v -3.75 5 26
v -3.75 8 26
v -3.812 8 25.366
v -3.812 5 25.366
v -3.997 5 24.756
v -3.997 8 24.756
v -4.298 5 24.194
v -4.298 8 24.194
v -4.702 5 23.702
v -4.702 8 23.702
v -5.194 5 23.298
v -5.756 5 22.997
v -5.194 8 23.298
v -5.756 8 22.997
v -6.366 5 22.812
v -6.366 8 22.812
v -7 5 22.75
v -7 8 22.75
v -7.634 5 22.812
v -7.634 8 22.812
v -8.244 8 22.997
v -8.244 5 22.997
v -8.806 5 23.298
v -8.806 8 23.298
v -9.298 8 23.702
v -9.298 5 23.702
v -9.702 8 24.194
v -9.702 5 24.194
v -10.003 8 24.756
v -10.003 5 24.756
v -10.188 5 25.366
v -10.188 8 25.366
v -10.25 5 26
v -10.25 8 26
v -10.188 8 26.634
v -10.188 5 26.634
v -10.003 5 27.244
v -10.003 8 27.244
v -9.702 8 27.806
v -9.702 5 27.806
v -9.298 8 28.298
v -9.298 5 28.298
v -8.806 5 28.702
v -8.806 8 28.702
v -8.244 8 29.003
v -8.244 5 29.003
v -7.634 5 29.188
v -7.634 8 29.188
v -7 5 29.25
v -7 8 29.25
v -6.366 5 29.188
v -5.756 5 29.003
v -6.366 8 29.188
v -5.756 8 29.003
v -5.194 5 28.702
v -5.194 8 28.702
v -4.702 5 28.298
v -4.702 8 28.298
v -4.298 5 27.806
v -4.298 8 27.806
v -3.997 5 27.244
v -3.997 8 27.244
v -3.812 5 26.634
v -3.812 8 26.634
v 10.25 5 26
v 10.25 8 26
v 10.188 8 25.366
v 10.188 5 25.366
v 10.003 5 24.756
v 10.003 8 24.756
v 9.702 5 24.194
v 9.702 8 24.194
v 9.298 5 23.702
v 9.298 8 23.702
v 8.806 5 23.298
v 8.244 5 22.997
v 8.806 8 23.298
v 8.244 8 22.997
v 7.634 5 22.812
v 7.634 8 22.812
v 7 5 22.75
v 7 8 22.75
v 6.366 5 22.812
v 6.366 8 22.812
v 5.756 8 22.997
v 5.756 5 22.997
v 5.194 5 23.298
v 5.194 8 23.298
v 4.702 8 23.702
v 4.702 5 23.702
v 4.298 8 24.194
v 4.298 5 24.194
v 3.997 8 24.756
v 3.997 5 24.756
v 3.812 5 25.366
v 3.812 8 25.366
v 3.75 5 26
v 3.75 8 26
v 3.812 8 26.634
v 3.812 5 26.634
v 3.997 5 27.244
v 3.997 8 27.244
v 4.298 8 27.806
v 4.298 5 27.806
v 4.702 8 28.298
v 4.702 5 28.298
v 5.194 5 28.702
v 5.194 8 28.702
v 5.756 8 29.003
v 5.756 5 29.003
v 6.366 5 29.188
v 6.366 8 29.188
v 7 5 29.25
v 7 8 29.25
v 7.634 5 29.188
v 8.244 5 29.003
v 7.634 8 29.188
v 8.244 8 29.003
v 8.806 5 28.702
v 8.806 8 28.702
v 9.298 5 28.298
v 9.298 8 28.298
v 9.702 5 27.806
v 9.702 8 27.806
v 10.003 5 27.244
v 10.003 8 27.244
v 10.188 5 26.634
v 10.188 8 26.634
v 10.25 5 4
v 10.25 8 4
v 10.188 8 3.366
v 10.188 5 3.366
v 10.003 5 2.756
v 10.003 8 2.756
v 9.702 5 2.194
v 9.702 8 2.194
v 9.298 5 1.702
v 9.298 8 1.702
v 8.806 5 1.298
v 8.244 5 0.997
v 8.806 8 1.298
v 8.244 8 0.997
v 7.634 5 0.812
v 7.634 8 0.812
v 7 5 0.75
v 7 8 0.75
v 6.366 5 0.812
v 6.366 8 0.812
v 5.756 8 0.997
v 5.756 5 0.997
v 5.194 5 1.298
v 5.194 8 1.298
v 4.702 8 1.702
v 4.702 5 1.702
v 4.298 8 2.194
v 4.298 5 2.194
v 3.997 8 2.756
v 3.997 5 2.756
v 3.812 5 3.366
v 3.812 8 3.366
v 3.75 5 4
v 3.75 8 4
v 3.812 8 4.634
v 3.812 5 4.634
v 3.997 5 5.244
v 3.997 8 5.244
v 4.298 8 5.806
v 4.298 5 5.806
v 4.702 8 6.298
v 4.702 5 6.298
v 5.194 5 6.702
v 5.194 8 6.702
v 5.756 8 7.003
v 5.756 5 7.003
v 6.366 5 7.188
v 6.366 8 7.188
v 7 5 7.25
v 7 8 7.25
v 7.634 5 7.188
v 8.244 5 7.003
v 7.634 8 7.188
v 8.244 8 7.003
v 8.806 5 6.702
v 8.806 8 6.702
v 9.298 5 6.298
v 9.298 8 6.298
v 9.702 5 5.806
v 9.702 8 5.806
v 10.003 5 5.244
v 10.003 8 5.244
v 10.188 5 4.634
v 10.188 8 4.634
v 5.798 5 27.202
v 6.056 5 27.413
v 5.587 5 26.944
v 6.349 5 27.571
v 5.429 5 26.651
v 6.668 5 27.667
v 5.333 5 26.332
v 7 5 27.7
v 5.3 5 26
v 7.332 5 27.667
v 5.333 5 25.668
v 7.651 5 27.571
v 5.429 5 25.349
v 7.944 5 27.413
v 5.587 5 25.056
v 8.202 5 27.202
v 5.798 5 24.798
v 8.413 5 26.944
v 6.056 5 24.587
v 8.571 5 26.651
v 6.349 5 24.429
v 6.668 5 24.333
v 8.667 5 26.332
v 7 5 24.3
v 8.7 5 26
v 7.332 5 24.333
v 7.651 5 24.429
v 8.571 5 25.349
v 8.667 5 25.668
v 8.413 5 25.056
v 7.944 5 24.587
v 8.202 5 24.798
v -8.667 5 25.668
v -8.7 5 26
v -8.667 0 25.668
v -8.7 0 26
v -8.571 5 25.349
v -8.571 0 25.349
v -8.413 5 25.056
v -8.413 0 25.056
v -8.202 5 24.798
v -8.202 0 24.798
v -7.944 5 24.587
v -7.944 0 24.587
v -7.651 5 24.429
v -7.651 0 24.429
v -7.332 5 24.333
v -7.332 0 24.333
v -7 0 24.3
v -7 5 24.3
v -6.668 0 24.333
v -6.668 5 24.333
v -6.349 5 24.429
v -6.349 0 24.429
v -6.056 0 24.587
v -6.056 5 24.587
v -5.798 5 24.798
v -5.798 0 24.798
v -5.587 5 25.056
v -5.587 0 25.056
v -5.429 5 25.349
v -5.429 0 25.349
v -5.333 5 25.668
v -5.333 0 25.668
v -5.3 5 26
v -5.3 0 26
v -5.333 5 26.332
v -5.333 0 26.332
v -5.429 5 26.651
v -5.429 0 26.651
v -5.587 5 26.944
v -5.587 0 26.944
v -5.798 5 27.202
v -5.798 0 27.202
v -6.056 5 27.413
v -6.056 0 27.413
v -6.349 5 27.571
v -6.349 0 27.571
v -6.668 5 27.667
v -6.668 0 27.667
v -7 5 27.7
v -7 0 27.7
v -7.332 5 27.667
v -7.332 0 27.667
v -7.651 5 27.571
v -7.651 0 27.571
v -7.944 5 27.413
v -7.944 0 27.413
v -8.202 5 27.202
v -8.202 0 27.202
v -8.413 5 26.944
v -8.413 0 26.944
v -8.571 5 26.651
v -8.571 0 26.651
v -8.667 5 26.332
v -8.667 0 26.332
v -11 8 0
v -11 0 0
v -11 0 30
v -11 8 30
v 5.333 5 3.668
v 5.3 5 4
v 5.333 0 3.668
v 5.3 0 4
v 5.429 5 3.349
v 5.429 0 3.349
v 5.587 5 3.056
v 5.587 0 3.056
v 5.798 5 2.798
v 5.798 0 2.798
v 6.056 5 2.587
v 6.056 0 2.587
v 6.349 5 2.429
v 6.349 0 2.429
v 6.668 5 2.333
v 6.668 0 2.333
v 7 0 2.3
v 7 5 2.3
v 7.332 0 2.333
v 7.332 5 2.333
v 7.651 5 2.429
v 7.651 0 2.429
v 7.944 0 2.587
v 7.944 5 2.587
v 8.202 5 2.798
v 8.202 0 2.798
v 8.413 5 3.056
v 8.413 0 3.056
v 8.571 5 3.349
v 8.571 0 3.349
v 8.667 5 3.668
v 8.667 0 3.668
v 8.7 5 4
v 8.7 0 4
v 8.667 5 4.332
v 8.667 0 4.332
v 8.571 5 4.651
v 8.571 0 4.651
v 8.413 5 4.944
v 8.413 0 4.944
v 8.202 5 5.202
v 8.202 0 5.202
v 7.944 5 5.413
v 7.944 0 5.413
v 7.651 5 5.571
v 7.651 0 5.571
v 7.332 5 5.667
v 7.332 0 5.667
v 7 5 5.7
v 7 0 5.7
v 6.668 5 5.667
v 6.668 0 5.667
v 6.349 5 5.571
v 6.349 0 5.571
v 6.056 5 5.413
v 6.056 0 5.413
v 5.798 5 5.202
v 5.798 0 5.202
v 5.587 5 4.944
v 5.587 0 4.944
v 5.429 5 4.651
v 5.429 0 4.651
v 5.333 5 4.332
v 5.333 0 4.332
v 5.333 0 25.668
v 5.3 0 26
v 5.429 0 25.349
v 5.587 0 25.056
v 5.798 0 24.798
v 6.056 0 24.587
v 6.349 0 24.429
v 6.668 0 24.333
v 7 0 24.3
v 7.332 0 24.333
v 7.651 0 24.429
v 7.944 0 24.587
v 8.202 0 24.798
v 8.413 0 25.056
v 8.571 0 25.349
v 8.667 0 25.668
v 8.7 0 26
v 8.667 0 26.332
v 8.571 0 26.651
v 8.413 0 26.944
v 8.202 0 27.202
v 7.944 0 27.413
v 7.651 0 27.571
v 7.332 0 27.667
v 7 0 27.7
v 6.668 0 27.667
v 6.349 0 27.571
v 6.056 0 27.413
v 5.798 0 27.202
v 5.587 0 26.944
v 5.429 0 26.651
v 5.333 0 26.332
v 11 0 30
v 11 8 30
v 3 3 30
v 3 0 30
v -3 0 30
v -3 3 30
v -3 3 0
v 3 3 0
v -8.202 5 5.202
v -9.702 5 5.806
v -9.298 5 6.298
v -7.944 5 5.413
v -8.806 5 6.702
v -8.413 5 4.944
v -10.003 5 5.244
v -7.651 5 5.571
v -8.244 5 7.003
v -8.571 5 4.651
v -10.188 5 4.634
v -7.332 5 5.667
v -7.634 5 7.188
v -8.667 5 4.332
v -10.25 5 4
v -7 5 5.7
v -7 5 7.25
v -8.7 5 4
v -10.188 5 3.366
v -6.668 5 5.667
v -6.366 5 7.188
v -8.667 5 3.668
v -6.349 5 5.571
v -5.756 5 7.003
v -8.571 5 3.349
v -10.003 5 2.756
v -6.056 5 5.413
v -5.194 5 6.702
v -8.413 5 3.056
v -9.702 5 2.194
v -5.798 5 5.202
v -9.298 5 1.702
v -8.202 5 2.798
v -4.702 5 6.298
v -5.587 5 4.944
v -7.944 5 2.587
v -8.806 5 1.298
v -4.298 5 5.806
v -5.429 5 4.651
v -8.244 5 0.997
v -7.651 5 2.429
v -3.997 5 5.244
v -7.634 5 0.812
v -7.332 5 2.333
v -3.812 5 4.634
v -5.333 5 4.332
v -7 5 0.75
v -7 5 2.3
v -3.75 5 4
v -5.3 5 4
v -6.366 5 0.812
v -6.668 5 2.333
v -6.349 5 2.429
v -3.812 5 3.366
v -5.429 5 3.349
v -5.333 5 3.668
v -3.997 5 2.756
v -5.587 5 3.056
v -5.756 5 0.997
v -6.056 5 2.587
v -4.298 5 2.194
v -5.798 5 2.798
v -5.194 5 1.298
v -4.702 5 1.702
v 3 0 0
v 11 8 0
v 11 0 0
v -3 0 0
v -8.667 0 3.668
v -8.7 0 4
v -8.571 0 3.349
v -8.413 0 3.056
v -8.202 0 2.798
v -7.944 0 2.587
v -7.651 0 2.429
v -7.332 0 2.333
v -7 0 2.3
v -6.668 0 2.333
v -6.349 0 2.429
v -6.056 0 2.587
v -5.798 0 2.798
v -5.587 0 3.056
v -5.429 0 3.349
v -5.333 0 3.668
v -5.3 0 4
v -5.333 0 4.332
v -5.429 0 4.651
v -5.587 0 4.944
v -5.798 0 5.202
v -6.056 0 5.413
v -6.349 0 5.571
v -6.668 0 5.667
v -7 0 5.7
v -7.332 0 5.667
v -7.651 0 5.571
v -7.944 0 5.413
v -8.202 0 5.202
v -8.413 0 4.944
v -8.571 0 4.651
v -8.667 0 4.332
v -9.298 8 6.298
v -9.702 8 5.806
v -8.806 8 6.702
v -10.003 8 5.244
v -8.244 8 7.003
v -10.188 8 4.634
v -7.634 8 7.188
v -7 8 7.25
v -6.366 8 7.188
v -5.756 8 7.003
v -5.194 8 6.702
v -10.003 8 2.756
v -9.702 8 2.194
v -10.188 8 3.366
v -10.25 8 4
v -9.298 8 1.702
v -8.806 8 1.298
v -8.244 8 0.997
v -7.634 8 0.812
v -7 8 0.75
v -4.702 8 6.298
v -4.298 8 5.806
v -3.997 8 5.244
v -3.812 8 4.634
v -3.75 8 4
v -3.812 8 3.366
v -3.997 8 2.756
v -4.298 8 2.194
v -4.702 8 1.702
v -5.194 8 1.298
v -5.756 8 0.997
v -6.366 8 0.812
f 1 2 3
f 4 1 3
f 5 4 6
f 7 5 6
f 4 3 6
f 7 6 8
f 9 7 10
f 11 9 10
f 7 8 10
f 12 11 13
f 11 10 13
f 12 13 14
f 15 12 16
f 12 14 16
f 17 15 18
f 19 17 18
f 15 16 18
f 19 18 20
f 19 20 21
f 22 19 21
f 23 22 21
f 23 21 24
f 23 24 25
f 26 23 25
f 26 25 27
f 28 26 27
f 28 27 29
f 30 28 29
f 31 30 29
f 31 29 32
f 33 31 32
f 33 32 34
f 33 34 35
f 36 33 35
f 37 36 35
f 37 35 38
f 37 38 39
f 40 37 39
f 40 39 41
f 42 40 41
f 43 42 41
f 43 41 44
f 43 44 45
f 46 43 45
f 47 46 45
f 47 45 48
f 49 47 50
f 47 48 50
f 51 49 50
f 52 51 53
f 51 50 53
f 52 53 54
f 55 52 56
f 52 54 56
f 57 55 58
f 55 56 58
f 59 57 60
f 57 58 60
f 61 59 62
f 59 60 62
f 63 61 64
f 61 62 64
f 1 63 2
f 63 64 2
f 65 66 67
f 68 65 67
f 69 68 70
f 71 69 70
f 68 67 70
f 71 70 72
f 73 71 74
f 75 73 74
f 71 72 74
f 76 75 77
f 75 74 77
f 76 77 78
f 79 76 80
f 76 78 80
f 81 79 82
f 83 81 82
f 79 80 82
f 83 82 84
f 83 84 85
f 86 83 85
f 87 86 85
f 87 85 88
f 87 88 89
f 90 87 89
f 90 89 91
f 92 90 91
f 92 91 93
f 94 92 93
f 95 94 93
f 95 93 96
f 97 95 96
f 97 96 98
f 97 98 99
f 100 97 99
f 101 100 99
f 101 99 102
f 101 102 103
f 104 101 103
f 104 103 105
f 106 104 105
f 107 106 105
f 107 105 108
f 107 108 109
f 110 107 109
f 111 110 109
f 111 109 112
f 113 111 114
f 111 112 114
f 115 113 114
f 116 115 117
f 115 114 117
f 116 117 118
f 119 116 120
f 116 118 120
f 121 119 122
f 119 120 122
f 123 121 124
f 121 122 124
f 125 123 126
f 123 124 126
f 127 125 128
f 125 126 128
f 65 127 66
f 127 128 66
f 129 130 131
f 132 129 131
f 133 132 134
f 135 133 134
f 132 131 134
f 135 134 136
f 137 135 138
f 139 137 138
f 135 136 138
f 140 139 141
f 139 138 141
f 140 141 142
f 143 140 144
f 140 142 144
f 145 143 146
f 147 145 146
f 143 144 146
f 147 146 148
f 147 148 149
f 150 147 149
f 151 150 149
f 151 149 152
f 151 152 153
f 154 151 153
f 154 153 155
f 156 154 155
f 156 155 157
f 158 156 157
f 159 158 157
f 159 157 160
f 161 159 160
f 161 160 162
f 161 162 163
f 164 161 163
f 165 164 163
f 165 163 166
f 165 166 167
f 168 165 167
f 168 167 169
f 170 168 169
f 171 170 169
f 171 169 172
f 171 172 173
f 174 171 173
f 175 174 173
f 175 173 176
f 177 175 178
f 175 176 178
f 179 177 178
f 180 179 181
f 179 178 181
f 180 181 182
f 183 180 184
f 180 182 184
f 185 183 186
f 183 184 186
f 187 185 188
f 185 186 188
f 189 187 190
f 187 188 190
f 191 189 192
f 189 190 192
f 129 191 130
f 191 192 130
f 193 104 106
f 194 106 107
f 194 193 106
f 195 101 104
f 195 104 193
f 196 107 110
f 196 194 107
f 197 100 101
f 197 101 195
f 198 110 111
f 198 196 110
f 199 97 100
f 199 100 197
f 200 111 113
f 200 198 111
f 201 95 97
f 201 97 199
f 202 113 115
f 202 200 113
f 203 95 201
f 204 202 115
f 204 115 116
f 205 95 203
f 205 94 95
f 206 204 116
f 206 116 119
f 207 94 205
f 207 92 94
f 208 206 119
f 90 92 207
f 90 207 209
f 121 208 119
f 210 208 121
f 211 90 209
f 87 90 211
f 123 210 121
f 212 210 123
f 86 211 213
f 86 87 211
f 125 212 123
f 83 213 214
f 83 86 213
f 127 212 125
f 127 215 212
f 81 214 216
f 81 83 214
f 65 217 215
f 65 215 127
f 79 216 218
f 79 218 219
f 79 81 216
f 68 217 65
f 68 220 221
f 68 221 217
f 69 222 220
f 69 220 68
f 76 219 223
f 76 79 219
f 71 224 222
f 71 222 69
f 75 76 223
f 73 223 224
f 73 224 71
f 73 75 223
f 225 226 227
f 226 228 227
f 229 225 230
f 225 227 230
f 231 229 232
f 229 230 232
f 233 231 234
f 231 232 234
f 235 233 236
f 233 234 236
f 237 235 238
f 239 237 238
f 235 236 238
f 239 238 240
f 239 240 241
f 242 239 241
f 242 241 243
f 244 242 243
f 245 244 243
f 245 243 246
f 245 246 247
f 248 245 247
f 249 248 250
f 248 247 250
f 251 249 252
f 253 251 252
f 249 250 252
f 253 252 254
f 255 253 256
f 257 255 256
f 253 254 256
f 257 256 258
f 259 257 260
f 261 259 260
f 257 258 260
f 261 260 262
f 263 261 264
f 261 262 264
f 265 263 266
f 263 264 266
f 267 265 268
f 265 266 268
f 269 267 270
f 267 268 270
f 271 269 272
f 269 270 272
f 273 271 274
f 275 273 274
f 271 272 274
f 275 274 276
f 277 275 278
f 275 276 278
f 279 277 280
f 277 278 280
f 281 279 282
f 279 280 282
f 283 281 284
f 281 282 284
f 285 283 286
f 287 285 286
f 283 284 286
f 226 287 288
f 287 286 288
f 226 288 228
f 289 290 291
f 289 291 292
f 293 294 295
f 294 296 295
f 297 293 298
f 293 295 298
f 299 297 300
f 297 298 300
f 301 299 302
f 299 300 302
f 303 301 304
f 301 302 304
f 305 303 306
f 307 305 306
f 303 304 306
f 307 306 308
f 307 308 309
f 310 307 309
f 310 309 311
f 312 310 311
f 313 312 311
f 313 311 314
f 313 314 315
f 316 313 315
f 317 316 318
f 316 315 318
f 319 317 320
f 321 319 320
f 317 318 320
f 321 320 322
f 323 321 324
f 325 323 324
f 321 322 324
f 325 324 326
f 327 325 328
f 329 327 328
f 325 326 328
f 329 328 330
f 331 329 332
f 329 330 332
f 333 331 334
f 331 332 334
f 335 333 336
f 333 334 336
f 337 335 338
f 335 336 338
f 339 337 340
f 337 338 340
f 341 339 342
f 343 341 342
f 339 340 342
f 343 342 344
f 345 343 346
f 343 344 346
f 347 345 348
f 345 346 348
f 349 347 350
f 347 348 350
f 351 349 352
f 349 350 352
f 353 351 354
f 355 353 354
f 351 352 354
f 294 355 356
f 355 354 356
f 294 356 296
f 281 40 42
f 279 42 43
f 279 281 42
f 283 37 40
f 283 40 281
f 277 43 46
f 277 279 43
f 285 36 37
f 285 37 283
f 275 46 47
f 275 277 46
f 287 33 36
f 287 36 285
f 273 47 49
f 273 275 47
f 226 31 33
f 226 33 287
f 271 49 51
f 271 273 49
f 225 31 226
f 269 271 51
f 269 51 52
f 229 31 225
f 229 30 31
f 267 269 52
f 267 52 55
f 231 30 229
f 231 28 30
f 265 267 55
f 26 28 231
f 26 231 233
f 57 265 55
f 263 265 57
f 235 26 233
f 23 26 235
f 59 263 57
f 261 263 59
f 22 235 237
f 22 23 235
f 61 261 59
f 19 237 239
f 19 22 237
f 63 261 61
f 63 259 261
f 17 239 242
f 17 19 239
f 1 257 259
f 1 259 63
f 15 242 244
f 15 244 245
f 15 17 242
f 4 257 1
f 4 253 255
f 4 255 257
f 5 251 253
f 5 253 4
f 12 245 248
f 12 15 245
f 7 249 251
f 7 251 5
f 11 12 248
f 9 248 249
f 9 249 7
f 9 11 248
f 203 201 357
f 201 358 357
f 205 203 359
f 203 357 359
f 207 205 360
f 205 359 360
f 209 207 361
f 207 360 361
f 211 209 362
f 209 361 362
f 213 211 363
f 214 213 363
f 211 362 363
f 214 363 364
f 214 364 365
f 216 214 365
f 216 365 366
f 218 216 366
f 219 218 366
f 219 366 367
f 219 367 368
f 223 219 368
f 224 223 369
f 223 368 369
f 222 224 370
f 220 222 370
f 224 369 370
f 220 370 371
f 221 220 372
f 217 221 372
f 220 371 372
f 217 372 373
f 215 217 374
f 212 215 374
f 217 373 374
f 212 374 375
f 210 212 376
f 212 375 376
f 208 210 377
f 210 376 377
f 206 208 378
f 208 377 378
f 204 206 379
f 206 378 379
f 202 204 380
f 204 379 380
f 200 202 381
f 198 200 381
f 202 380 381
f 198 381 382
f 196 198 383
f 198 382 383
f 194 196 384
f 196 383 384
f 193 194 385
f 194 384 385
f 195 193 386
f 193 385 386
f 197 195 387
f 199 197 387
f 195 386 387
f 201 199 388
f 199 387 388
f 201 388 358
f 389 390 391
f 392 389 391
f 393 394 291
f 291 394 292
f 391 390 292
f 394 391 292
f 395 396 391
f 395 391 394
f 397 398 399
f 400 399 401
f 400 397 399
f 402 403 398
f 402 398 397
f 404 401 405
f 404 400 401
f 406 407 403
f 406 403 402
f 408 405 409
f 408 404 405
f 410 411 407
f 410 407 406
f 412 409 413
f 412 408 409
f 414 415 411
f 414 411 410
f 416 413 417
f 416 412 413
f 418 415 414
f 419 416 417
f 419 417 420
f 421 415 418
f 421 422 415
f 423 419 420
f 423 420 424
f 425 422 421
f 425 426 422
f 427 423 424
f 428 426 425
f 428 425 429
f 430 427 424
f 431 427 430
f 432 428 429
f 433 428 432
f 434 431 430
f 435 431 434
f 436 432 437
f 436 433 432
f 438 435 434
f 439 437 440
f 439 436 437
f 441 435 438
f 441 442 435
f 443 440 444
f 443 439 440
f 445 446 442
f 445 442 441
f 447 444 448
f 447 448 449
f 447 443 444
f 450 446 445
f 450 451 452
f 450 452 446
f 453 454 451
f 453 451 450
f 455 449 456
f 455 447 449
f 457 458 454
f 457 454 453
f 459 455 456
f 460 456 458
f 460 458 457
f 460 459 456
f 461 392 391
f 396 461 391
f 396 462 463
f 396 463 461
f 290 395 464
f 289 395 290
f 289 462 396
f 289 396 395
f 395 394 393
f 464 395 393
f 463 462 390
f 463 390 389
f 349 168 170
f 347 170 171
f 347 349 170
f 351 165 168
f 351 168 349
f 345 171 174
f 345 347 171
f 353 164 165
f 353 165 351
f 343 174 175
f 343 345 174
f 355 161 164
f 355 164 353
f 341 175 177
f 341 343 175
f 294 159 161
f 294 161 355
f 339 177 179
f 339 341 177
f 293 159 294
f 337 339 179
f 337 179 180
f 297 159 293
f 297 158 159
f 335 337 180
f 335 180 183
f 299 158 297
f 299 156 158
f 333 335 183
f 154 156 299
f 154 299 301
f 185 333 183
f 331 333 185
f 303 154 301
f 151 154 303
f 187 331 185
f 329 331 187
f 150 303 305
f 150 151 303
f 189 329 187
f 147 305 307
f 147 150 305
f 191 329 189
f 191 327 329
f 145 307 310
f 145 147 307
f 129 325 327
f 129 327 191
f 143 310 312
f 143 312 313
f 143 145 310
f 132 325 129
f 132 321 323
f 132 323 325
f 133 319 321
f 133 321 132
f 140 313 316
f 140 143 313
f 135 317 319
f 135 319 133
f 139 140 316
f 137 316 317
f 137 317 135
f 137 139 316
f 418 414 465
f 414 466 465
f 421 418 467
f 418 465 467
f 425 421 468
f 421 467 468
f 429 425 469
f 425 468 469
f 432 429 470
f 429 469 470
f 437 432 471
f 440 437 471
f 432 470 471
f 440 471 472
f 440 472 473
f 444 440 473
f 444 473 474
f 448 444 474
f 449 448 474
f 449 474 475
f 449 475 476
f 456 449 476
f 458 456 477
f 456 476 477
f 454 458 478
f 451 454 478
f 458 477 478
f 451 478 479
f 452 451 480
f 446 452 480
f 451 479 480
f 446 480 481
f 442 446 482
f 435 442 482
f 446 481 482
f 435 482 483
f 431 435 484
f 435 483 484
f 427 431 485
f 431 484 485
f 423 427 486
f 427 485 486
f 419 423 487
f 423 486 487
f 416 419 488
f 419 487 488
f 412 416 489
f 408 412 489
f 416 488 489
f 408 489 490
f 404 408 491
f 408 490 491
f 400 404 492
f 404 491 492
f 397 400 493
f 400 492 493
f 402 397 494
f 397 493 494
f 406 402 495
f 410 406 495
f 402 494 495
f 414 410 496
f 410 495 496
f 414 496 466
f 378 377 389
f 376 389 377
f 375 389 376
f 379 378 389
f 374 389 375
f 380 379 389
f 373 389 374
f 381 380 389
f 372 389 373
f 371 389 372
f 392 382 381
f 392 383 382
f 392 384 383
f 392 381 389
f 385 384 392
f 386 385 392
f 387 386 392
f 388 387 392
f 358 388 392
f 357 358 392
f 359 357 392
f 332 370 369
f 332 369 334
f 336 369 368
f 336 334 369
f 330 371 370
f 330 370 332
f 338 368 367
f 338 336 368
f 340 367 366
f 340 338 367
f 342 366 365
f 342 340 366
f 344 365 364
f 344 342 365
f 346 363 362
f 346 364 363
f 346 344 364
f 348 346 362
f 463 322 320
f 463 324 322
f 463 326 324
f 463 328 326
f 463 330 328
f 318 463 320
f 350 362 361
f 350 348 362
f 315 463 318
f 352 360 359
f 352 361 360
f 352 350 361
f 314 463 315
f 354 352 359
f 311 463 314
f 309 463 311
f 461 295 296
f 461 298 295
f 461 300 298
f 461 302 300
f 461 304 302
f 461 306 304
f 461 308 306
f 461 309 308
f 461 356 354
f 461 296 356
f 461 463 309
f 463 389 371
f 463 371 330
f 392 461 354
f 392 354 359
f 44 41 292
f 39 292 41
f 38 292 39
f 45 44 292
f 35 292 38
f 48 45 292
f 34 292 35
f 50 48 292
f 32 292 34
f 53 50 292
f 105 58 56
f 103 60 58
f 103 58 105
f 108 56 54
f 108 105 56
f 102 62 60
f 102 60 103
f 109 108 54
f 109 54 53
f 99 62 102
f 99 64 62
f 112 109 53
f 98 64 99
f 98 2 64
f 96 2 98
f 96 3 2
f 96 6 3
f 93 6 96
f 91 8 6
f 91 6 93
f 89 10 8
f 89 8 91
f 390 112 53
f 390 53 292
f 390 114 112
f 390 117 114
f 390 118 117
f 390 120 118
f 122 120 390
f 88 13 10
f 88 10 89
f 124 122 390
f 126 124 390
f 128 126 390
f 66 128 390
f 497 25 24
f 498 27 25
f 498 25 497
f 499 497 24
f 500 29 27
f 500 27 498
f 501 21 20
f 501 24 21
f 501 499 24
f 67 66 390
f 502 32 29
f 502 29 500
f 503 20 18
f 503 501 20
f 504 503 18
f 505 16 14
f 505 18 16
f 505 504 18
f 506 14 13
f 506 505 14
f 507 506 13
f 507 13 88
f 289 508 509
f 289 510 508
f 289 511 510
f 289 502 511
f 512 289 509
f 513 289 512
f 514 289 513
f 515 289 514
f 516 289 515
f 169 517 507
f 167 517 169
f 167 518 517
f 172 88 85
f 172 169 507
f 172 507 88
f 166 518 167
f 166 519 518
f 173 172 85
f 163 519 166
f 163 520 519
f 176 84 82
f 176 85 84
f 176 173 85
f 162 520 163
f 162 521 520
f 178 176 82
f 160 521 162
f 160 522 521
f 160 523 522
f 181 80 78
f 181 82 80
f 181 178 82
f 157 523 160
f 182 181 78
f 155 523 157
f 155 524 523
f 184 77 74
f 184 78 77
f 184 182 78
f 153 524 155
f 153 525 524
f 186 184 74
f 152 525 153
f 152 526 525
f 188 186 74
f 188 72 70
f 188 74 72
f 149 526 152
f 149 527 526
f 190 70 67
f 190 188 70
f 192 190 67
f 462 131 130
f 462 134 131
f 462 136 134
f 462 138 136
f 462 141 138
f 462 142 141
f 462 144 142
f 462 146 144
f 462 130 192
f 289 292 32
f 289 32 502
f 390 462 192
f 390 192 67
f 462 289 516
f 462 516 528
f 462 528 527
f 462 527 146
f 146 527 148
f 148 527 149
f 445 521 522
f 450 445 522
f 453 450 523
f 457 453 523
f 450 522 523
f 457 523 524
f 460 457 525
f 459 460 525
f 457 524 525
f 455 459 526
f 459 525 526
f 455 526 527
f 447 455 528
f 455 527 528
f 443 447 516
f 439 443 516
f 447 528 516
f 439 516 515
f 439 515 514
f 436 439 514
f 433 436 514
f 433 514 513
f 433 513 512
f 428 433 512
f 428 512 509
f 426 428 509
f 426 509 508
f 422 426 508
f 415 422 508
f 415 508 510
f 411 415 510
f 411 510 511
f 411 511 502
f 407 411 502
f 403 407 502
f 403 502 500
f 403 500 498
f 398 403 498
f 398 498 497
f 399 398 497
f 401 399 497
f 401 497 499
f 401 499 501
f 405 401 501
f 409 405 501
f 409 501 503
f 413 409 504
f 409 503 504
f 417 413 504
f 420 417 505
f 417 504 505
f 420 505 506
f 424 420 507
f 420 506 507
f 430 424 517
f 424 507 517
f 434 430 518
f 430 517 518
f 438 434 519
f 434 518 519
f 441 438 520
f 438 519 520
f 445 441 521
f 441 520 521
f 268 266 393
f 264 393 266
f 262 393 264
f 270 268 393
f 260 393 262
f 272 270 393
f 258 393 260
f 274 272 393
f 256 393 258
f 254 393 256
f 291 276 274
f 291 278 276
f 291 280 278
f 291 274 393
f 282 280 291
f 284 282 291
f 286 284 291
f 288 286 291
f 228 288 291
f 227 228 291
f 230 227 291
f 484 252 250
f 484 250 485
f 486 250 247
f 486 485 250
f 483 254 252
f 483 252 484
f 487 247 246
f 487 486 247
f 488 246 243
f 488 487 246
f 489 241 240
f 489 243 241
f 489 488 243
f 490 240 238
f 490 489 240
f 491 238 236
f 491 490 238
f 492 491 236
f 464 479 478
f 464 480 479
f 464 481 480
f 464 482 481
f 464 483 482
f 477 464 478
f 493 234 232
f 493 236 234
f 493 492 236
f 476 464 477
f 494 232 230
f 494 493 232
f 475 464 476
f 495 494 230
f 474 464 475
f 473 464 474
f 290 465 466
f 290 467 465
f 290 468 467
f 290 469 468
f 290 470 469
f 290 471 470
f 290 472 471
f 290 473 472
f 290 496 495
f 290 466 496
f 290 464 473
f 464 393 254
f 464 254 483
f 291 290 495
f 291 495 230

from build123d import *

# Parameters (mm, degrees)
EXTRUDE_1_DEPTH             = 30
HOLE_WIZARD_M31_D           = 3.4
HOLE_WIZARD_M31_CBORE_D     = 6.5
HOLE_WIZARD_M31_CBORE_DEPTH = 3


with BuildPart() as part:
    # Эскиз1 → Бобышка-Вытянуть1 (new body)
    with BuildSketch(Plane.XY):
        Polygon((-3, 0), (-11, 0), (-11, 8), (11, 8), (11, 0), (3, 0), (3, 3), (-3, 3), align=None)
    extrude(amount=EXTRUDE_1_DEPTH)

    # Цековка для винта с внутренним шестигранником M31 (through all)
    with Locations(Plane(origin=(0, 8, 0), x_dir=(1, 0, 0), z_dir=(0, 1, 0))):
        with Locations((-7, -4), (7, -4), (7, -26), (-7, -26)):
            CounterBoreHole(HOLE_WIZARD_M31_D / 2, HOLE_WIZARD_M31_CBORE_D / 2, HOLE_WIZARD_M31_CBORE_DEPTH)


solid = part.part
